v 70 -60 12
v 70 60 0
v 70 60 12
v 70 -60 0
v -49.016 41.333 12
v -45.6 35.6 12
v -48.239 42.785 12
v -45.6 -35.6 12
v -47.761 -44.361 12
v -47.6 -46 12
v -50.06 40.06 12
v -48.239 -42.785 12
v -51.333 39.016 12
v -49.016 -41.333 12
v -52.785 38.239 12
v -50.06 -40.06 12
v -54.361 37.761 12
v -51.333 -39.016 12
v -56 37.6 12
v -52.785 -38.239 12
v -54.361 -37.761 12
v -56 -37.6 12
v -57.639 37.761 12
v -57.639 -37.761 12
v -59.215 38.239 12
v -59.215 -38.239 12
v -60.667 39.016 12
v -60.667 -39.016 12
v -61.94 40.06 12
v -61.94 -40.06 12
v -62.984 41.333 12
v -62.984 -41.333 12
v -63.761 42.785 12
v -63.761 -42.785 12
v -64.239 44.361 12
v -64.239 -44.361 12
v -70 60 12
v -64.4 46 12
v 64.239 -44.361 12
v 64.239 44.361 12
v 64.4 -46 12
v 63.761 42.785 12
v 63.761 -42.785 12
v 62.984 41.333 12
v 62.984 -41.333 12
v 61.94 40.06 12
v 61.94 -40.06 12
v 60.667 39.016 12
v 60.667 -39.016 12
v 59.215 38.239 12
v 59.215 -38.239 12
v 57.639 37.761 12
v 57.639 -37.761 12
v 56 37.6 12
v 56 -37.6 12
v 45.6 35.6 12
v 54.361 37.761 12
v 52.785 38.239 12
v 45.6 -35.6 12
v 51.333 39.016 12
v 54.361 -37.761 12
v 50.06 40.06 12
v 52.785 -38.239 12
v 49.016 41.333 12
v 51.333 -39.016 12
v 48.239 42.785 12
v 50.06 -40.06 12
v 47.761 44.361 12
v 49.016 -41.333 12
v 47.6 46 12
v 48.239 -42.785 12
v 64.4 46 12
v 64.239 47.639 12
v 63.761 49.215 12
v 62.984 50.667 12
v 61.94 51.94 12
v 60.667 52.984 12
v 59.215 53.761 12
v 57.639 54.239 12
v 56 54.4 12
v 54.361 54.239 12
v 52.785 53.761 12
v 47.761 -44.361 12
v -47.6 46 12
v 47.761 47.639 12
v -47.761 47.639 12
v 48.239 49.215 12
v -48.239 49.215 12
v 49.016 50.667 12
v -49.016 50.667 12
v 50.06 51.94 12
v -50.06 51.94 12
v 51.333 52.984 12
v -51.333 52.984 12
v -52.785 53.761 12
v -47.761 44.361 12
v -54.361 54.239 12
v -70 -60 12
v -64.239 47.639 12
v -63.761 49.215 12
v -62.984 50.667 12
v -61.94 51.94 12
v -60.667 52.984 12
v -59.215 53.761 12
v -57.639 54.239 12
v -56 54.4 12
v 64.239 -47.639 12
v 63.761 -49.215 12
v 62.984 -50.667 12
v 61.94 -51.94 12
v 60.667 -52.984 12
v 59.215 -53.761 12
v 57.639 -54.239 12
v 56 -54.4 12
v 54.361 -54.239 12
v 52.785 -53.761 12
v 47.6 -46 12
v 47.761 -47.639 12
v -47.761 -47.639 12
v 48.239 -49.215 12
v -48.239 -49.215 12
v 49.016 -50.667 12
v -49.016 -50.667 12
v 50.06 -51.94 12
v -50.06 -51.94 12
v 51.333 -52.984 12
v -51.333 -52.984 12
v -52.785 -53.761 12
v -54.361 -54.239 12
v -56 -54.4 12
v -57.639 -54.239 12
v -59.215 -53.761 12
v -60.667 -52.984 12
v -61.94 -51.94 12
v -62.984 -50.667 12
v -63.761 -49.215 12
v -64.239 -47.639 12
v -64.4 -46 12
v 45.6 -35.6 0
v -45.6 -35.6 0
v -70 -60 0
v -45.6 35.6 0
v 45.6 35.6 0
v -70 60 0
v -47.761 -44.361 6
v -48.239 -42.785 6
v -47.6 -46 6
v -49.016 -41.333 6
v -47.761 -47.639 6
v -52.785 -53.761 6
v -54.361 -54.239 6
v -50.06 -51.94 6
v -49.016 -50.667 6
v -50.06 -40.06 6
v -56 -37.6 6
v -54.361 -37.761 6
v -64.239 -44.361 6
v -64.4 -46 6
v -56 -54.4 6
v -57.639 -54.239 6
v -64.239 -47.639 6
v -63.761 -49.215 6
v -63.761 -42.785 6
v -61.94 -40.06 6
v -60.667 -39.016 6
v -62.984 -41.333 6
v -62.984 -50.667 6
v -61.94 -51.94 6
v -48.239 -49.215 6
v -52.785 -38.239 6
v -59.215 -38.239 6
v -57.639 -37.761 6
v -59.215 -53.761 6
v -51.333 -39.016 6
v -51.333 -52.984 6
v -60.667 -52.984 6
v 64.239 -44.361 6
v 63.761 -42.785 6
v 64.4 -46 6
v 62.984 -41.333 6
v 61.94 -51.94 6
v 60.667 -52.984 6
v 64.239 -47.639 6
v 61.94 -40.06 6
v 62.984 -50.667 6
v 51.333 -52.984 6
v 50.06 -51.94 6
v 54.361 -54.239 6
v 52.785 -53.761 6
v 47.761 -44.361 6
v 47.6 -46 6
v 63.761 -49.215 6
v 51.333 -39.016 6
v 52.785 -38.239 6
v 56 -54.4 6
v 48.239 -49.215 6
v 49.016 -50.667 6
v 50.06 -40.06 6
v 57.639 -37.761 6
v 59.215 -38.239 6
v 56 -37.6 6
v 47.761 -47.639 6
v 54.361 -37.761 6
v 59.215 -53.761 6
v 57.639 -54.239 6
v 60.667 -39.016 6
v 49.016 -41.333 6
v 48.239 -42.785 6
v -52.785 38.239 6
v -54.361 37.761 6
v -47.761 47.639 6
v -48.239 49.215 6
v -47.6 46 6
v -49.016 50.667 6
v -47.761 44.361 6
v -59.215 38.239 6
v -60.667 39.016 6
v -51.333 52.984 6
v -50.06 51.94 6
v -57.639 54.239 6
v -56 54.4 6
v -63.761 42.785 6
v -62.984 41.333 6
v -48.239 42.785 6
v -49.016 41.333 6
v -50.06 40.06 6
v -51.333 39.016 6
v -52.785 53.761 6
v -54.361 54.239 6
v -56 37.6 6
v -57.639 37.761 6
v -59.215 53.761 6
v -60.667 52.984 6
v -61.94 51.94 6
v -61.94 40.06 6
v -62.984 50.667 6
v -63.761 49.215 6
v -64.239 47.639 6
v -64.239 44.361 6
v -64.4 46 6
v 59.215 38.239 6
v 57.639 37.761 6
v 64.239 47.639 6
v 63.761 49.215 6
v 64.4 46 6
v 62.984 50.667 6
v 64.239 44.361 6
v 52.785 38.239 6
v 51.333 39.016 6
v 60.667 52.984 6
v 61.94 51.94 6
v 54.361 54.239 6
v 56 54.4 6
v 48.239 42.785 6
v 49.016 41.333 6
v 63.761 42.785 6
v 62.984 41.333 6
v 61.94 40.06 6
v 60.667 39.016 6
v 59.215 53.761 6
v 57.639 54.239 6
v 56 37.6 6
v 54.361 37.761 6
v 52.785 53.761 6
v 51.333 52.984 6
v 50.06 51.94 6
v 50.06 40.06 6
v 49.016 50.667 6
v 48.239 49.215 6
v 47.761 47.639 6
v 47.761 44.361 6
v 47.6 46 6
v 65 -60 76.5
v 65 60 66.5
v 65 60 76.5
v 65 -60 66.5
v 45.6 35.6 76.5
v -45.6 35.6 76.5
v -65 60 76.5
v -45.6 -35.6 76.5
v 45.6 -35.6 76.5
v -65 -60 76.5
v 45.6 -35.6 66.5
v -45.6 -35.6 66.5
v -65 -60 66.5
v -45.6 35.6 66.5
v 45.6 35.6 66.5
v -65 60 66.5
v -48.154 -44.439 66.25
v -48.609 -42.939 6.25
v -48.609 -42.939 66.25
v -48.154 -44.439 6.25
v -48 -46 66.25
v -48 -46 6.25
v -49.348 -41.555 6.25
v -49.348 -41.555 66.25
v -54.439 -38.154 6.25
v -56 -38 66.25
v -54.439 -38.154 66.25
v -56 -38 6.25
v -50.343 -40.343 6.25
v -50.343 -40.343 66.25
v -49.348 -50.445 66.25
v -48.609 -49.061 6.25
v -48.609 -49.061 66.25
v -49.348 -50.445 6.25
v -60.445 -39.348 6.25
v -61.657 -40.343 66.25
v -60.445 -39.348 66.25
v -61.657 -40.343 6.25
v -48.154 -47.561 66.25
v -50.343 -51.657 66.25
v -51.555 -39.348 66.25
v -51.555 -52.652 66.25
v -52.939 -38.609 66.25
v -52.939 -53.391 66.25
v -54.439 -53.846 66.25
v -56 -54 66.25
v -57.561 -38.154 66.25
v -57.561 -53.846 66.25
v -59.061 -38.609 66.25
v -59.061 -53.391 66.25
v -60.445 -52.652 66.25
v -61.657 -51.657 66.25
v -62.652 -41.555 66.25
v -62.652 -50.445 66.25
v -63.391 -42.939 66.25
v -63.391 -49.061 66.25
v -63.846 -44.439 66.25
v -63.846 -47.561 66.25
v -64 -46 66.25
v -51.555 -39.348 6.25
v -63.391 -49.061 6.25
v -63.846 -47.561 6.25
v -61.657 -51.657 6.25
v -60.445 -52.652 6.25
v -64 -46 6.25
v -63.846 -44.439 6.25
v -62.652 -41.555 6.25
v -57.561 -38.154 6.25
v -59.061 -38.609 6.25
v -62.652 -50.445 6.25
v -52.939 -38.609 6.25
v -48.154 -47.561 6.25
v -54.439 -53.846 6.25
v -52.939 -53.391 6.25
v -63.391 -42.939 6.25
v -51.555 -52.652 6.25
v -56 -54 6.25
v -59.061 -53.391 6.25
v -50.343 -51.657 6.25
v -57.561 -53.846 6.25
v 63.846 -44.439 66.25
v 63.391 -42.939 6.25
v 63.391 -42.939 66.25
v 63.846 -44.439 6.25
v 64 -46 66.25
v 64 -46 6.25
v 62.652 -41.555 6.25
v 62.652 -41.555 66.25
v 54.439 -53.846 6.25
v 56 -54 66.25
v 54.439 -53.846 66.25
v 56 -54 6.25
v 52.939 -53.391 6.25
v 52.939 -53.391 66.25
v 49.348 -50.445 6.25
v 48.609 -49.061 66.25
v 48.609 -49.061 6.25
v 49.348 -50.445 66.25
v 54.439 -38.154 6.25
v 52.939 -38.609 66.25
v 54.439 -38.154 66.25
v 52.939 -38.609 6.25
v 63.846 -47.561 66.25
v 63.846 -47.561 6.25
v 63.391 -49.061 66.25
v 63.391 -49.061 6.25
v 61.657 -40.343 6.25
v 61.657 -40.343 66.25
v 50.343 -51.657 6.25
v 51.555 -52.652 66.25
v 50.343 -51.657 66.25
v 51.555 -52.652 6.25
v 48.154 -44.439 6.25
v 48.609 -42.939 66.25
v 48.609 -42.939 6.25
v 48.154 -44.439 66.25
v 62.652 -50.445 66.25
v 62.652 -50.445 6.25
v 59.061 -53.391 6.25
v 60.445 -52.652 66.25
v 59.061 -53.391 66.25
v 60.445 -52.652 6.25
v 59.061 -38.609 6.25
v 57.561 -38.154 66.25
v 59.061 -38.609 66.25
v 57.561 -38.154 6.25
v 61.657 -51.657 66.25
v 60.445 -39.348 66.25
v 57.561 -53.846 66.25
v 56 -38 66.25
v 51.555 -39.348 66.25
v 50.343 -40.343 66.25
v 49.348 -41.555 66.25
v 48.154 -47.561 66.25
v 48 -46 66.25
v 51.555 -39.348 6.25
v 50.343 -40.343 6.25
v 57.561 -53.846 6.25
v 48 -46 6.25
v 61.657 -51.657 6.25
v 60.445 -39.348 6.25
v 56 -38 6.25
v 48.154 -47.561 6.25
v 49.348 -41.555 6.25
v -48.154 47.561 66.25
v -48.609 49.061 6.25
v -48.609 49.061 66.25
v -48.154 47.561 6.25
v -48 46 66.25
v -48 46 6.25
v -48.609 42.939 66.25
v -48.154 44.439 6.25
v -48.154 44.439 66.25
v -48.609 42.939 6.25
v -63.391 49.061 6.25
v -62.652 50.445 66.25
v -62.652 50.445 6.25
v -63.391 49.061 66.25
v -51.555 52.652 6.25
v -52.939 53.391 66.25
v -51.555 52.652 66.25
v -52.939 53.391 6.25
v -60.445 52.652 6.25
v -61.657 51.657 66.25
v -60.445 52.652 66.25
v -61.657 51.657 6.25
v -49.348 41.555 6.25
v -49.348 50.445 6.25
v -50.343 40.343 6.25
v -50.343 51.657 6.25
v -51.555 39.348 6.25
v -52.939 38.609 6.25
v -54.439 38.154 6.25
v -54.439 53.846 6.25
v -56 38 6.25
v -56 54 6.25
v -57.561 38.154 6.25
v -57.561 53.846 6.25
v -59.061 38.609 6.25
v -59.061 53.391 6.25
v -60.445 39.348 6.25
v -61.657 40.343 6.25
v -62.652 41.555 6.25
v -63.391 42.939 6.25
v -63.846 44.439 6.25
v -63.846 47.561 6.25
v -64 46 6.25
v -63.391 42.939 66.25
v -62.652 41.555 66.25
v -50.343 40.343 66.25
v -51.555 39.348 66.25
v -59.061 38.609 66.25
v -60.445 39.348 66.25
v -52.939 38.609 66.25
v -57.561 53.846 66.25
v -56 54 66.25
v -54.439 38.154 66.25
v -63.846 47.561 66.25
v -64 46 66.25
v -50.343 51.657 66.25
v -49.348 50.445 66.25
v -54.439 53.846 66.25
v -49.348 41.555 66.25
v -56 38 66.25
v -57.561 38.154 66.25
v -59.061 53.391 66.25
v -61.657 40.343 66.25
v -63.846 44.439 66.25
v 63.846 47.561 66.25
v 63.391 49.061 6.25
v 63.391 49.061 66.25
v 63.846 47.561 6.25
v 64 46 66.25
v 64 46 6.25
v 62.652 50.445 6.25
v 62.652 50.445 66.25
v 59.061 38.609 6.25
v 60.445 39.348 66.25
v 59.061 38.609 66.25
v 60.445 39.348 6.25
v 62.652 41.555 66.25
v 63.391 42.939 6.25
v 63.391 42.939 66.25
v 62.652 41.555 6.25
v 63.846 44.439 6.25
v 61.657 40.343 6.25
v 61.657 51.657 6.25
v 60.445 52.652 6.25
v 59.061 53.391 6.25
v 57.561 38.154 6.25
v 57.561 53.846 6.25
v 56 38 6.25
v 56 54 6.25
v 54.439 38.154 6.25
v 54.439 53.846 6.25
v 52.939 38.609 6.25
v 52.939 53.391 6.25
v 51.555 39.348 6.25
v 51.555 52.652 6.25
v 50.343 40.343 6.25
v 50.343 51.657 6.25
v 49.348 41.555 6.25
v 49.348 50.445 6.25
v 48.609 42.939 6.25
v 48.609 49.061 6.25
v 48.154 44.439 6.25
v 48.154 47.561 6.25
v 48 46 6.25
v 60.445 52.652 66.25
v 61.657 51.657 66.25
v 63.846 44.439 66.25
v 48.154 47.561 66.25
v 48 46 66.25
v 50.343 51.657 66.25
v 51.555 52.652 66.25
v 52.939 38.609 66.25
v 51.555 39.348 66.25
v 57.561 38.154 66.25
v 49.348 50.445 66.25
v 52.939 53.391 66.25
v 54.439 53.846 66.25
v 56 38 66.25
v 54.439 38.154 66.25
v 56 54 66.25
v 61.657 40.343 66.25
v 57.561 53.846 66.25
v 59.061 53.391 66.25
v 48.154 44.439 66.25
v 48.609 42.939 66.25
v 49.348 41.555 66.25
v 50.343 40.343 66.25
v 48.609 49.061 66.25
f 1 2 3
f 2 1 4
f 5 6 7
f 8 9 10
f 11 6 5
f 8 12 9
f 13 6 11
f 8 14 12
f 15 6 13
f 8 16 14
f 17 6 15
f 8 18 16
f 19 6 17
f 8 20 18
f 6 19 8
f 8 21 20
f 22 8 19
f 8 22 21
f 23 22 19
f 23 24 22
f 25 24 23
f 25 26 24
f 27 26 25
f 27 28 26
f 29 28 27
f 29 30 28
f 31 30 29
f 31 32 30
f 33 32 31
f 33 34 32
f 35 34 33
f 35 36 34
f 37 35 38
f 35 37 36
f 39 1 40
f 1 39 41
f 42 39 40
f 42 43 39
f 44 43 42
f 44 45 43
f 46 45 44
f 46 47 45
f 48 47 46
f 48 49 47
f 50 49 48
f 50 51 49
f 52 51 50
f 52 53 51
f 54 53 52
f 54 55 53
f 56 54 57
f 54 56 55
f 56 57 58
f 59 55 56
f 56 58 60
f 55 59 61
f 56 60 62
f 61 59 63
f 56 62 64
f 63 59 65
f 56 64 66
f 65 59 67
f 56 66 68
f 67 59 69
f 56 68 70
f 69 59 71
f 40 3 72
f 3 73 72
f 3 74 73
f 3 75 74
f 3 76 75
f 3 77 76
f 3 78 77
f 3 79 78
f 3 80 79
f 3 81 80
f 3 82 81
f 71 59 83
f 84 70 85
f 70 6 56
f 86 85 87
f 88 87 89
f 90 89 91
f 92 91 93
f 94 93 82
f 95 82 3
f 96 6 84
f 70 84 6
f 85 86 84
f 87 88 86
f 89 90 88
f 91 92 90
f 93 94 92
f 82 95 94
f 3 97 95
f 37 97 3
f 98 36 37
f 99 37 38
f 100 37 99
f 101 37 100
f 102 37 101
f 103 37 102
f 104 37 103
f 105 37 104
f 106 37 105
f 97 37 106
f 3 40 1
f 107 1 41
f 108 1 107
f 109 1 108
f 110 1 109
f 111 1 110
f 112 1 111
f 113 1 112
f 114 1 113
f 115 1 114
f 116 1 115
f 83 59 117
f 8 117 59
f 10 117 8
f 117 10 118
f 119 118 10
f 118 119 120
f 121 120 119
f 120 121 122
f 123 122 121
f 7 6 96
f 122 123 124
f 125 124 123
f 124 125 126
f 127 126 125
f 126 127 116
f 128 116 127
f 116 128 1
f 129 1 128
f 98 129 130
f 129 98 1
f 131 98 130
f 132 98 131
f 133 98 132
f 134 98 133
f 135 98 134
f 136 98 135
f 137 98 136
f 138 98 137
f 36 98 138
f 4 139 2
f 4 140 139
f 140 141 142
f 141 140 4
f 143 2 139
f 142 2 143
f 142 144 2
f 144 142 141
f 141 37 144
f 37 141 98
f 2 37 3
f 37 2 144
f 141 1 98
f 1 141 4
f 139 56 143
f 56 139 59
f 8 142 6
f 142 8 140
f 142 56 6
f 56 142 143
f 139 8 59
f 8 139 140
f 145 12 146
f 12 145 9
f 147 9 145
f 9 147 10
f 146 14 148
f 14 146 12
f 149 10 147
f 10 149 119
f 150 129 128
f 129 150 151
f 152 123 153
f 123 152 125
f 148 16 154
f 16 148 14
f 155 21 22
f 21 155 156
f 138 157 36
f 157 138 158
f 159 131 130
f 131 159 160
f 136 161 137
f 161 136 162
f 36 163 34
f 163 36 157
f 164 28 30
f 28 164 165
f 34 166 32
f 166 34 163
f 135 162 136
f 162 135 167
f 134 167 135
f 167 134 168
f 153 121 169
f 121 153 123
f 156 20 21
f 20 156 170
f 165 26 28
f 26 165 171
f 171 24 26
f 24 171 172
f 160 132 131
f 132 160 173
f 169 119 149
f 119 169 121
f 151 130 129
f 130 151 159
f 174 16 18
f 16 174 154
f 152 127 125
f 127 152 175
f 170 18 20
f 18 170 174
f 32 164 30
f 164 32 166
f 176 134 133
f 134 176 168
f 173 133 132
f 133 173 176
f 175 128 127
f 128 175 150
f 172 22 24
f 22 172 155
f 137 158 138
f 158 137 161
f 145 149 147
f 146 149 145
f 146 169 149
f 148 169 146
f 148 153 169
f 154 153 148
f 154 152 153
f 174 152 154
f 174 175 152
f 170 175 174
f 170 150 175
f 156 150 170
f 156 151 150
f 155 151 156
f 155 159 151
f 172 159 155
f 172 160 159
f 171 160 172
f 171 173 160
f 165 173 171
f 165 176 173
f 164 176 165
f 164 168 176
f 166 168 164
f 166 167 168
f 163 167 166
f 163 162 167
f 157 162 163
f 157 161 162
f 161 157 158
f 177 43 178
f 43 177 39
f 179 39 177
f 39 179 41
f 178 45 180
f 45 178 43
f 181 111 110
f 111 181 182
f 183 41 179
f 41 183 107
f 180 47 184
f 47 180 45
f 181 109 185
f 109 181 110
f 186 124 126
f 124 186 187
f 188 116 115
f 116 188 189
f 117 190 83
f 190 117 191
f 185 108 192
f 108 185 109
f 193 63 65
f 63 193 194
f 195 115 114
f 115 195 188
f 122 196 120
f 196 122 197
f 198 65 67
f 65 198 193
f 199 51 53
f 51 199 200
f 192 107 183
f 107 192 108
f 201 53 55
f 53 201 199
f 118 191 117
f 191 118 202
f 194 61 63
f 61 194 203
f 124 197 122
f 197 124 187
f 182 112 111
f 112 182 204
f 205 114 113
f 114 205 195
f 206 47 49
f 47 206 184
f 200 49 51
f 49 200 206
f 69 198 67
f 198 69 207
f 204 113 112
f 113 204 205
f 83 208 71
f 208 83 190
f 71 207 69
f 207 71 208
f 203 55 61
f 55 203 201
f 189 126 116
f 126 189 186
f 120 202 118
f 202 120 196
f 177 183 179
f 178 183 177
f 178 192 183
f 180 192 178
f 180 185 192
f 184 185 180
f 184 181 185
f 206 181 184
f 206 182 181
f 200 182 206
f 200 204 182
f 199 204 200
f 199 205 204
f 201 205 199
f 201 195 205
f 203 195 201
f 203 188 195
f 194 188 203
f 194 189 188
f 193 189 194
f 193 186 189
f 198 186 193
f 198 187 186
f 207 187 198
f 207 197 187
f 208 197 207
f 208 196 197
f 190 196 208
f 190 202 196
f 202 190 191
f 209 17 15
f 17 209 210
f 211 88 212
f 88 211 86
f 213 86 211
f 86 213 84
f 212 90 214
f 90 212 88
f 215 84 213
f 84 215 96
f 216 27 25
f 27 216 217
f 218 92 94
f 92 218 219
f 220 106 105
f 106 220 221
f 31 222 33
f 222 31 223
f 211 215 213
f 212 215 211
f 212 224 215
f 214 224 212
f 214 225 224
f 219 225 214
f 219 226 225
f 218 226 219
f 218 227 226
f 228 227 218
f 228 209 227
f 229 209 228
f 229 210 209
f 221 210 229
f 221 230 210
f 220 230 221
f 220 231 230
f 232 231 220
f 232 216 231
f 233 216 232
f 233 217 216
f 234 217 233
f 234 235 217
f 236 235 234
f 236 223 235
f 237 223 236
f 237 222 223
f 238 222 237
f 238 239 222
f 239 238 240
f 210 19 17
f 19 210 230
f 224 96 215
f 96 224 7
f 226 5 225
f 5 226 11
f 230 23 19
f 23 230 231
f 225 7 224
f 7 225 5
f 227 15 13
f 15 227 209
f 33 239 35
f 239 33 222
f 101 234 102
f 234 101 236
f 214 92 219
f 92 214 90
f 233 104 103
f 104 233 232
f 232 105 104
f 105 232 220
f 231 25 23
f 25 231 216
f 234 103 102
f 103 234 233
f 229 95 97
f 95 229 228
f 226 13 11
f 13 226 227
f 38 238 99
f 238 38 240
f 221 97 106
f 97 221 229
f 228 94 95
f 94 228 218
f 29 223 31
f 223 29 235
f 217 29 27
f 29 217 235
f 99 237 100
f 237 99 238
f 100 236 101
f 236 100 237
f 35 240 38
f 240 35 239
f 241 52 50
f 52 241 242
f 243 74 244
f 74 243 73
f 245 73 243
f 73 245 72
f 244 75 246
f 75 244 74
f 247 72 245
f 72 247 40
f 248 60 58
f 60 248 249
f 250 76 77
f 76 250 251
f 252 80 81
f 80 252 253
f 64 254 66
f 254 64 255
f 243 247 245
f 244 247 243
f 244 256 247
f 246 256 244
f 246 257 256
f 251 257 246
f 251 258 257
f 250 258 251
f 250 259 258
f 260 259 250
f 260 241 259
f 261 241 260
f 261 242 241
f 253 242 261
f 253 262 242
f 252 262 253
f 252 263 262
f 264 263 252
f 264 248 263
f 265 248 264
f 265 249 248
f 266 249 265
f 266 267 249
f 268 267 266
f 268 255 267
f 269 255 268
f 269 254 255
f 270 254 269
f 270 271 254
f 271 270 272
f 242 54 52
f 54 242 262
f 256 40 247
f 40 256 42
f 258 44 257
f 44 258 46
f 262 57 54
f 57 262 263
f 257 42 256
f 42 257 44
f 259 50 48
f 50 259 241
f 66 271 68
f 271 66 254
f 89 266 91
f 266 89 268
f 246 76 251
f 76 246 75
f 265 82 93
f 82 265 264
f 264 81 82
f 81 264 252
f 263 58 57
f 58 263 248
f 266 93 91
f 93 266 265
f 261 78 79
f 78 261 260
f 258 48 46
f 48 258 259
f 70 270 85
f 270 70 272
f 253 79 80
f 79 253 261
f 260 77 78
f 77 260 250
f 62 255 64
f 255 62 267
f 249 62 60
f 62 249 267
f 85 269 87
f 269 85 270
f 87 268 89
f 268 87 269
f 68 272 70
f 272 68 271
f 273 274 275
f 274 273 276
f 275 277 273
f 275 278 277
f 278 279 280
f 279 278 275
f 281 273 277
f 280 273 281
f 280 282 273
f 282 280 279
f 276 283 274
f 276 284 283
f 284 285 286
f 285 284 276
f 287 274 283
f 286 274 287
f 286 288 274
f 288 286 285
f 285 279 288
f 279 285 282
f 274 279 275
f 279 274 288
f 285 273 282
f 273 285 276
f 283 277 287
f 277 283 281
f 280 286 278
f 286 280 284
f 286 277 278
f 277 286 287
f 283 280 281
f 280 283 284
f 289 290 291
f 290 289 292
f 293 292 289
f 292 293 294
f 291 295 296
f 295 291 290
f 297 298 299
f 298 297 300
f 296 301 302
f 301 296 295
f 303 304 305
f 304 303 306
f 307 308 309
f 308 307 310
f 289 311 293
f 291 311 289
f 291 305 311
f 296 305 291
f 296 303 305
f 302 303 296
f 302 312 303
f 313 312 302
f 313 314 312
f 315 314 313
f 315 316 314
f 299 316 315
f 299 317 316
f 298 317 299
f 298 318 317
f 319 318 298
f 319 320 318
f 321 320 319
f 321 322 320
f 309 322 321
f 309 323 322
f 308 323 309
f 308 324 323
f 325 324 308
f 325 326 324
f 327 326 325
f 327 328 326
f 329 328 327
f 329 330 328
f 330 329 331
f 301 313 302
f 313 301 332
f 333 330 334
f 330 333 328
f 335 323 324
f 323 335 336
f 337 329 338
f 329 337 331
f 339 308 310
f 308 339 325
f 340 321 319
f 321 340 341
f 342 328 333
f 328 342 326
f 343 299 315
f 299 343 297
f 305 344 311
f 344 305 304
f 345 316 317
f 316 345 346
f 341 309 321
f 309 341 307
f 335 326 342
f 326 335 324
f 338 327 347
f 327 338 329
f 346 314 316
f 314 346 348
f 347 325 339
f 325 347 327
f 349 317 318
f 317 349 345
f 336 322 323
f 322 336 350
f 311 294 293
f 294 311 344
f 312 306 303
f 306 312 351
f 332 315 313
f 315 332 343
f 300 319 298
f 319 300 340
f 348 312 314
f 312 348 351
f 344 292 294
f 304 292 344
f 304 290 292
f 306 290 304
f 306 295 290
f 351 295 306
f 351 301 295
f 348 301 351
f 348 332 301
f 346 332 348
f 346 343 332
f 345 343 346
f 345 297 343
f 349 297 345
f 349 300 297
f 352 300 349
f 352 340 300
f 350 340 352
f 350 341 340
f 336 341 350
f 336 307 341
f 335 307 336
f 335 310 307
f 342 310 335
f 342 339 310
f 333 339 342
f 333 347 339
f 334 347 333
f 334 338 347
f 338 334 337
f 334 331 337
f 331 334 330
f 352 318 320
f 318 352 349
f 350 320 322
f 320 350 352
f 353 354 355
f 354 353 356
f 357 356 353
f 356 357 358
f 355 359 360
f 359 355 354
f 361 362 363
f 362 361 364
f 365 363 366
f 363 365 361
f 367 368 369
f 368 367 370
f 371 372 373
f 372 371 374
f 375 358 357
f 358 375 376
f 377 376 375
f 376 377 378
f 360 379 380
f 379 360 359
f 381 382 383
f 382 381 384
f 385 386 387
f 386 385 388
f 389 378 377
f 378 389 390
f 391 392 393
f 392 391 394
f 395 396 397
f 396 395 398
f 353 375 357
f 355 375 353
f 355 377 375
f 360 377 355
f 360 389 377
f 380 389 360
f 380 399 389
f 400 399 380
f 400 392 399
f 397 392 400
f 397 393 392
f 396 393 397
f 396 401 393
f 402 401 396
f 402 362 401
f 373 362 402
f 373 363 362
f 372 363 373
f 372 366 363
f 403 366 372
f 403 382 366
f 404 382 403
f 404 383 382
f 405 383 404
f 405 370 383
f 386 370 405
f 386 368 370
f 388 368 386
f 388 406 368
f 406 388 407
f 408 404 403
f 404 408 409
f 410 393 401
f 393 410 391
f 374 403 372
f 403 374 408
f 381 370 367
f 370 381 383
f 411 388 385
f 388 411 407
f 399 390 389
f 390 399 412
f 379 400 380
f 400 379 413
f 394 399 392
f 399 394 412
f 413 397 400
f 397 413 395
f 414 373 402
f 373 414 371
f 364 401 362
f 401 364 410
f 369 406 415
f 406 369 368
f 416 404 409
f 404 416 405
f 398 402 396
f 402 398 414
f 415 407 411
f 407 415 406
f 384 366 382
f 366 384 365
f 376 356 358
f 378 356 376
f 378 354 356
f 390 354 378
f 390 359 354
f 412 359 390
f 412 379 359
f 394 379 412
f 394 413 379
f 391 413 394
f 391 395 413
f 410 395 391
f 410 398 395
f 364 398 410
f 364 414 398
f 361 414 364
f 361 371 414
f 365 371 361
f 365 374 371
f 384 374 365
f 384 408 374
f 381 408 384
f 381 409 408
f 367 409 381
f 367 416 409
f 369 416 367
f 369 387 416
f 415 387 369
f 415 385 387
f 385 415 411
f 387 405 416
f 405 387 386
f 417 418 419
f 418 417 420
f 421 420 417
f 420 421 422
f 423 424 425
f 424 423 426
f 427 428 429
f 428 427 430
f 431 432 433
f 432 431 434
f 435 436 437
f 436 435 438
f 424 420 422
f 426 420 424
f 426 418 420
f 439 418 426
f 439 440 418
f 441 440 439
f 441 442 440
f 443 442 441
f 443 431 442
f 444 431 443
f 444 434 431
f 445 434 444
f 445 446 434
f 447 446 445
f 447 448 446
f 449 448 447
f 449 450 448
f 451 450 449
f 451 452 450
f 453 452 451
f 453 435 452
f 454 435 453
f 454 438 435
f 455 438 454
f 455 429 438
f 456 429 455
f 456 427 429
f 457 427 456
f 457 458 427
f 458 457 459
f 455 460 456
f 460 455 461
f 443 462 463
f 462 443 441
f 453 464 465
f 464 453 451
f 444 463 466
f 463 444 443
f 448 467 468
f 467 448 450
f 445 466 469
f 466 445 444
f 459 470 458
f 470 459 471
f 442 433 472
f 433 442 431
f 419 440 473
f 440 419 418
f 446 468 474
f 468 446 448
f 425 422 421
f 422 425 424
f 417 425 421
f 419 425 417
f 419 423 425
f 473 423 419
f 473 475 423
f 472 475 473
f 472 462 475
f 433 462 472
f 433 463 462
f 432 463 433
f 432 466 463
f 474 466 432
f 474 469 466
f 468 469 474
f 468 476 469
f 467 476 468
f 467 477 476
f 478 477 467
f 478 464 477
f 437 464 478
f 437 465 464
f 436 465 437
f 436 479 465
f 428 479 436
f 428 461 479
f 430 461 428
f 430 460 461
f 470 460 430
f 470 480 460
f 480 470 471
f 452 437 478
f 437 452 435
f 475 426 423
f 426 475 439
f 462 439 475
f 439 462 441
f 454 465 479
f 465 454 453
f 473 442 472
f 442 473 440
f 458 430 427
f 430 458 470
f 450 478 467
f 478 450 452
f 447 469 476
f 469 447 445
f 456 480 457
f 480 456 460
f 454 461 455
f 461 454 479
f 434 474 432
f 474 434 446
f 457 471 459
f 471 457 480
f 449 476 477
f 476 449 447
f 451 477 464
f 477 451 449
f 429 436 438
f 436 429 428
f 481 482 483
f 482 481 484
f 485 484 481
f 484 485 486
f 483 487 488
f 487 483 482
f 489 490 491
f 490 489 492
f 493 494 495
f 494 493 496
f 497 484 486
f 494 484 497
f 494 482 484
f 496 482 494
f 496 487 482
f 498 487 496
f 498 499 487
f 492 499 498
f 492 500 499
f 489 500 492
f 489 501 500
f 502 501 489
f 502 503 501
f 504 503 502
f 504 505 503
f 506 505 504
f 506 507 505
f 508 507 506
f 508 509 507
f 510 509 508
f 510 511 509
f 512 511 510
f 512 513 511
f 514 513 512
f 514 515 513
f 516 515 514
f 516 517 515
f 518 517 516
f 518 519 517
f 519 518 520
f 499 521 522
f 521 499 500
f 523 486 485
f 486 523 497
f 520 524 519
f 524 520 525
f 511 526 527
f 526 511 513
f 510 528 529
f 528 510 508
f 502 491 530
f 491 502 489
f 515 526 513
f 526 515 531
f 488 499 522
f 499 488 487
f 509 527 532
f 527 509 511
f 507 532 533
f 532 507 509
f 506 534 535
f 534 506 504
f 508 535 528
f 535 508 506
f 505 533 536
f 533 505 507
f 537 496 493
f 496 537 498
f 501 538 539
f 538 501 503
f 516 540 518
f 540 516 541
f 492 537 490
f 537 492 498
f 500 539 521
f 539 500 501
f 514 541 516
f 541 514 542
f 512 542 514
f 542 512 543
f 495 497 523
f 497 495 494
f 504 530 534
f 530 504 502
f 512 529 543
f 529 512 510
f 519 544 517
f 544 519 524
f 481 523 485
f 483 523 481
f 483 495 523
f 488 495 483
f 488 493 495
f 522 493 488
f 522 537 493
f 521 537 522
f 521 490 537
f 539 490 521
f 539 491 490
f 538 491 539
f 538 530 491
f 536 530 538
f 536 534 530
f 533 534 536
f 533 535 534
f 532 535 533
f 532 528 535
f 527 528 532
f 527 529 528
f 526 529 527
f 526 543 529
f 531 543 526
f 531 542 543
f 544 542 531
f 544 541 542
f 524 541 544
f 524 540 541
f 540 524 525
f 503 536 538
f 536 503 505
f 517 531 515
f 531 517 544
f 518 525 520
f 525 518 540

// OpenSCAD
$fn = 32;

// ------------------------------------------------------------------------
// Frame cube: base 140 x 120 mm, posts 60 mm tall
// Every part is its own module, assembly() places every instance.
// ------------------------------------------------------------------------

// --- part 1 ---
module base_frame() {
  difference() {
    translate([-70, -60, 0]) cube([140, 120, 12]);
    translate([-45.6, -35.6, -1]) cube([91.2, 71.2, 14]);
    translate([-56, -46, 6]) cylinder(h = 7, d = 16.8);
    translate([56, -46, 6]) cylinder(h = 7, d = 16.8);
    translate([-56, 46, 6]) cylinder(h = 7, d = 16.8);
    translate([56, 46, 6]) cylinder(h = 7, d = 16.8);
  }
}

// --- part 2 ---
module corner_post() {
  cylinder(h = 60, d = 16);
}

// --- part 3 ---
module top_frame() {
  difference() {
    translate([-65, -60, 0]) cube([130, 120, 10]);
    translate([-45.6, -35.6, -1]) cube([91.2, 71.2, 12]);
  }
}

// --- assembly ---
module assembly() {
  color([0.80, 0.24, 0.20]) translate([0, 0, 0]) rotate([0, 0, 0]) base_frame();
  color([0.20, 0.45, 0.75]) translate([-56, -46, 6.25]) rotate([0, 0, 0]) corner_post();
  color([0.25, 0.62, 0.32]) translate([56, -46, 6.25]) rotate([0, 0, 0]) corner_post();
  color([0.92, 0.70, 0.18]) translate([-56, 46, 6.25]) rotate([0, 0, 0]) corner_post();
  color([0.58, 0.35, 0.70]) translate([56, 46, 6.25]) rotate([0, 0, 0]) corner_post();
  color([0.16, 0.66, 0.66]) translate([0, 0, 66.5]) rotate([0, 0, 0]) top_frame();
}

assembly();
